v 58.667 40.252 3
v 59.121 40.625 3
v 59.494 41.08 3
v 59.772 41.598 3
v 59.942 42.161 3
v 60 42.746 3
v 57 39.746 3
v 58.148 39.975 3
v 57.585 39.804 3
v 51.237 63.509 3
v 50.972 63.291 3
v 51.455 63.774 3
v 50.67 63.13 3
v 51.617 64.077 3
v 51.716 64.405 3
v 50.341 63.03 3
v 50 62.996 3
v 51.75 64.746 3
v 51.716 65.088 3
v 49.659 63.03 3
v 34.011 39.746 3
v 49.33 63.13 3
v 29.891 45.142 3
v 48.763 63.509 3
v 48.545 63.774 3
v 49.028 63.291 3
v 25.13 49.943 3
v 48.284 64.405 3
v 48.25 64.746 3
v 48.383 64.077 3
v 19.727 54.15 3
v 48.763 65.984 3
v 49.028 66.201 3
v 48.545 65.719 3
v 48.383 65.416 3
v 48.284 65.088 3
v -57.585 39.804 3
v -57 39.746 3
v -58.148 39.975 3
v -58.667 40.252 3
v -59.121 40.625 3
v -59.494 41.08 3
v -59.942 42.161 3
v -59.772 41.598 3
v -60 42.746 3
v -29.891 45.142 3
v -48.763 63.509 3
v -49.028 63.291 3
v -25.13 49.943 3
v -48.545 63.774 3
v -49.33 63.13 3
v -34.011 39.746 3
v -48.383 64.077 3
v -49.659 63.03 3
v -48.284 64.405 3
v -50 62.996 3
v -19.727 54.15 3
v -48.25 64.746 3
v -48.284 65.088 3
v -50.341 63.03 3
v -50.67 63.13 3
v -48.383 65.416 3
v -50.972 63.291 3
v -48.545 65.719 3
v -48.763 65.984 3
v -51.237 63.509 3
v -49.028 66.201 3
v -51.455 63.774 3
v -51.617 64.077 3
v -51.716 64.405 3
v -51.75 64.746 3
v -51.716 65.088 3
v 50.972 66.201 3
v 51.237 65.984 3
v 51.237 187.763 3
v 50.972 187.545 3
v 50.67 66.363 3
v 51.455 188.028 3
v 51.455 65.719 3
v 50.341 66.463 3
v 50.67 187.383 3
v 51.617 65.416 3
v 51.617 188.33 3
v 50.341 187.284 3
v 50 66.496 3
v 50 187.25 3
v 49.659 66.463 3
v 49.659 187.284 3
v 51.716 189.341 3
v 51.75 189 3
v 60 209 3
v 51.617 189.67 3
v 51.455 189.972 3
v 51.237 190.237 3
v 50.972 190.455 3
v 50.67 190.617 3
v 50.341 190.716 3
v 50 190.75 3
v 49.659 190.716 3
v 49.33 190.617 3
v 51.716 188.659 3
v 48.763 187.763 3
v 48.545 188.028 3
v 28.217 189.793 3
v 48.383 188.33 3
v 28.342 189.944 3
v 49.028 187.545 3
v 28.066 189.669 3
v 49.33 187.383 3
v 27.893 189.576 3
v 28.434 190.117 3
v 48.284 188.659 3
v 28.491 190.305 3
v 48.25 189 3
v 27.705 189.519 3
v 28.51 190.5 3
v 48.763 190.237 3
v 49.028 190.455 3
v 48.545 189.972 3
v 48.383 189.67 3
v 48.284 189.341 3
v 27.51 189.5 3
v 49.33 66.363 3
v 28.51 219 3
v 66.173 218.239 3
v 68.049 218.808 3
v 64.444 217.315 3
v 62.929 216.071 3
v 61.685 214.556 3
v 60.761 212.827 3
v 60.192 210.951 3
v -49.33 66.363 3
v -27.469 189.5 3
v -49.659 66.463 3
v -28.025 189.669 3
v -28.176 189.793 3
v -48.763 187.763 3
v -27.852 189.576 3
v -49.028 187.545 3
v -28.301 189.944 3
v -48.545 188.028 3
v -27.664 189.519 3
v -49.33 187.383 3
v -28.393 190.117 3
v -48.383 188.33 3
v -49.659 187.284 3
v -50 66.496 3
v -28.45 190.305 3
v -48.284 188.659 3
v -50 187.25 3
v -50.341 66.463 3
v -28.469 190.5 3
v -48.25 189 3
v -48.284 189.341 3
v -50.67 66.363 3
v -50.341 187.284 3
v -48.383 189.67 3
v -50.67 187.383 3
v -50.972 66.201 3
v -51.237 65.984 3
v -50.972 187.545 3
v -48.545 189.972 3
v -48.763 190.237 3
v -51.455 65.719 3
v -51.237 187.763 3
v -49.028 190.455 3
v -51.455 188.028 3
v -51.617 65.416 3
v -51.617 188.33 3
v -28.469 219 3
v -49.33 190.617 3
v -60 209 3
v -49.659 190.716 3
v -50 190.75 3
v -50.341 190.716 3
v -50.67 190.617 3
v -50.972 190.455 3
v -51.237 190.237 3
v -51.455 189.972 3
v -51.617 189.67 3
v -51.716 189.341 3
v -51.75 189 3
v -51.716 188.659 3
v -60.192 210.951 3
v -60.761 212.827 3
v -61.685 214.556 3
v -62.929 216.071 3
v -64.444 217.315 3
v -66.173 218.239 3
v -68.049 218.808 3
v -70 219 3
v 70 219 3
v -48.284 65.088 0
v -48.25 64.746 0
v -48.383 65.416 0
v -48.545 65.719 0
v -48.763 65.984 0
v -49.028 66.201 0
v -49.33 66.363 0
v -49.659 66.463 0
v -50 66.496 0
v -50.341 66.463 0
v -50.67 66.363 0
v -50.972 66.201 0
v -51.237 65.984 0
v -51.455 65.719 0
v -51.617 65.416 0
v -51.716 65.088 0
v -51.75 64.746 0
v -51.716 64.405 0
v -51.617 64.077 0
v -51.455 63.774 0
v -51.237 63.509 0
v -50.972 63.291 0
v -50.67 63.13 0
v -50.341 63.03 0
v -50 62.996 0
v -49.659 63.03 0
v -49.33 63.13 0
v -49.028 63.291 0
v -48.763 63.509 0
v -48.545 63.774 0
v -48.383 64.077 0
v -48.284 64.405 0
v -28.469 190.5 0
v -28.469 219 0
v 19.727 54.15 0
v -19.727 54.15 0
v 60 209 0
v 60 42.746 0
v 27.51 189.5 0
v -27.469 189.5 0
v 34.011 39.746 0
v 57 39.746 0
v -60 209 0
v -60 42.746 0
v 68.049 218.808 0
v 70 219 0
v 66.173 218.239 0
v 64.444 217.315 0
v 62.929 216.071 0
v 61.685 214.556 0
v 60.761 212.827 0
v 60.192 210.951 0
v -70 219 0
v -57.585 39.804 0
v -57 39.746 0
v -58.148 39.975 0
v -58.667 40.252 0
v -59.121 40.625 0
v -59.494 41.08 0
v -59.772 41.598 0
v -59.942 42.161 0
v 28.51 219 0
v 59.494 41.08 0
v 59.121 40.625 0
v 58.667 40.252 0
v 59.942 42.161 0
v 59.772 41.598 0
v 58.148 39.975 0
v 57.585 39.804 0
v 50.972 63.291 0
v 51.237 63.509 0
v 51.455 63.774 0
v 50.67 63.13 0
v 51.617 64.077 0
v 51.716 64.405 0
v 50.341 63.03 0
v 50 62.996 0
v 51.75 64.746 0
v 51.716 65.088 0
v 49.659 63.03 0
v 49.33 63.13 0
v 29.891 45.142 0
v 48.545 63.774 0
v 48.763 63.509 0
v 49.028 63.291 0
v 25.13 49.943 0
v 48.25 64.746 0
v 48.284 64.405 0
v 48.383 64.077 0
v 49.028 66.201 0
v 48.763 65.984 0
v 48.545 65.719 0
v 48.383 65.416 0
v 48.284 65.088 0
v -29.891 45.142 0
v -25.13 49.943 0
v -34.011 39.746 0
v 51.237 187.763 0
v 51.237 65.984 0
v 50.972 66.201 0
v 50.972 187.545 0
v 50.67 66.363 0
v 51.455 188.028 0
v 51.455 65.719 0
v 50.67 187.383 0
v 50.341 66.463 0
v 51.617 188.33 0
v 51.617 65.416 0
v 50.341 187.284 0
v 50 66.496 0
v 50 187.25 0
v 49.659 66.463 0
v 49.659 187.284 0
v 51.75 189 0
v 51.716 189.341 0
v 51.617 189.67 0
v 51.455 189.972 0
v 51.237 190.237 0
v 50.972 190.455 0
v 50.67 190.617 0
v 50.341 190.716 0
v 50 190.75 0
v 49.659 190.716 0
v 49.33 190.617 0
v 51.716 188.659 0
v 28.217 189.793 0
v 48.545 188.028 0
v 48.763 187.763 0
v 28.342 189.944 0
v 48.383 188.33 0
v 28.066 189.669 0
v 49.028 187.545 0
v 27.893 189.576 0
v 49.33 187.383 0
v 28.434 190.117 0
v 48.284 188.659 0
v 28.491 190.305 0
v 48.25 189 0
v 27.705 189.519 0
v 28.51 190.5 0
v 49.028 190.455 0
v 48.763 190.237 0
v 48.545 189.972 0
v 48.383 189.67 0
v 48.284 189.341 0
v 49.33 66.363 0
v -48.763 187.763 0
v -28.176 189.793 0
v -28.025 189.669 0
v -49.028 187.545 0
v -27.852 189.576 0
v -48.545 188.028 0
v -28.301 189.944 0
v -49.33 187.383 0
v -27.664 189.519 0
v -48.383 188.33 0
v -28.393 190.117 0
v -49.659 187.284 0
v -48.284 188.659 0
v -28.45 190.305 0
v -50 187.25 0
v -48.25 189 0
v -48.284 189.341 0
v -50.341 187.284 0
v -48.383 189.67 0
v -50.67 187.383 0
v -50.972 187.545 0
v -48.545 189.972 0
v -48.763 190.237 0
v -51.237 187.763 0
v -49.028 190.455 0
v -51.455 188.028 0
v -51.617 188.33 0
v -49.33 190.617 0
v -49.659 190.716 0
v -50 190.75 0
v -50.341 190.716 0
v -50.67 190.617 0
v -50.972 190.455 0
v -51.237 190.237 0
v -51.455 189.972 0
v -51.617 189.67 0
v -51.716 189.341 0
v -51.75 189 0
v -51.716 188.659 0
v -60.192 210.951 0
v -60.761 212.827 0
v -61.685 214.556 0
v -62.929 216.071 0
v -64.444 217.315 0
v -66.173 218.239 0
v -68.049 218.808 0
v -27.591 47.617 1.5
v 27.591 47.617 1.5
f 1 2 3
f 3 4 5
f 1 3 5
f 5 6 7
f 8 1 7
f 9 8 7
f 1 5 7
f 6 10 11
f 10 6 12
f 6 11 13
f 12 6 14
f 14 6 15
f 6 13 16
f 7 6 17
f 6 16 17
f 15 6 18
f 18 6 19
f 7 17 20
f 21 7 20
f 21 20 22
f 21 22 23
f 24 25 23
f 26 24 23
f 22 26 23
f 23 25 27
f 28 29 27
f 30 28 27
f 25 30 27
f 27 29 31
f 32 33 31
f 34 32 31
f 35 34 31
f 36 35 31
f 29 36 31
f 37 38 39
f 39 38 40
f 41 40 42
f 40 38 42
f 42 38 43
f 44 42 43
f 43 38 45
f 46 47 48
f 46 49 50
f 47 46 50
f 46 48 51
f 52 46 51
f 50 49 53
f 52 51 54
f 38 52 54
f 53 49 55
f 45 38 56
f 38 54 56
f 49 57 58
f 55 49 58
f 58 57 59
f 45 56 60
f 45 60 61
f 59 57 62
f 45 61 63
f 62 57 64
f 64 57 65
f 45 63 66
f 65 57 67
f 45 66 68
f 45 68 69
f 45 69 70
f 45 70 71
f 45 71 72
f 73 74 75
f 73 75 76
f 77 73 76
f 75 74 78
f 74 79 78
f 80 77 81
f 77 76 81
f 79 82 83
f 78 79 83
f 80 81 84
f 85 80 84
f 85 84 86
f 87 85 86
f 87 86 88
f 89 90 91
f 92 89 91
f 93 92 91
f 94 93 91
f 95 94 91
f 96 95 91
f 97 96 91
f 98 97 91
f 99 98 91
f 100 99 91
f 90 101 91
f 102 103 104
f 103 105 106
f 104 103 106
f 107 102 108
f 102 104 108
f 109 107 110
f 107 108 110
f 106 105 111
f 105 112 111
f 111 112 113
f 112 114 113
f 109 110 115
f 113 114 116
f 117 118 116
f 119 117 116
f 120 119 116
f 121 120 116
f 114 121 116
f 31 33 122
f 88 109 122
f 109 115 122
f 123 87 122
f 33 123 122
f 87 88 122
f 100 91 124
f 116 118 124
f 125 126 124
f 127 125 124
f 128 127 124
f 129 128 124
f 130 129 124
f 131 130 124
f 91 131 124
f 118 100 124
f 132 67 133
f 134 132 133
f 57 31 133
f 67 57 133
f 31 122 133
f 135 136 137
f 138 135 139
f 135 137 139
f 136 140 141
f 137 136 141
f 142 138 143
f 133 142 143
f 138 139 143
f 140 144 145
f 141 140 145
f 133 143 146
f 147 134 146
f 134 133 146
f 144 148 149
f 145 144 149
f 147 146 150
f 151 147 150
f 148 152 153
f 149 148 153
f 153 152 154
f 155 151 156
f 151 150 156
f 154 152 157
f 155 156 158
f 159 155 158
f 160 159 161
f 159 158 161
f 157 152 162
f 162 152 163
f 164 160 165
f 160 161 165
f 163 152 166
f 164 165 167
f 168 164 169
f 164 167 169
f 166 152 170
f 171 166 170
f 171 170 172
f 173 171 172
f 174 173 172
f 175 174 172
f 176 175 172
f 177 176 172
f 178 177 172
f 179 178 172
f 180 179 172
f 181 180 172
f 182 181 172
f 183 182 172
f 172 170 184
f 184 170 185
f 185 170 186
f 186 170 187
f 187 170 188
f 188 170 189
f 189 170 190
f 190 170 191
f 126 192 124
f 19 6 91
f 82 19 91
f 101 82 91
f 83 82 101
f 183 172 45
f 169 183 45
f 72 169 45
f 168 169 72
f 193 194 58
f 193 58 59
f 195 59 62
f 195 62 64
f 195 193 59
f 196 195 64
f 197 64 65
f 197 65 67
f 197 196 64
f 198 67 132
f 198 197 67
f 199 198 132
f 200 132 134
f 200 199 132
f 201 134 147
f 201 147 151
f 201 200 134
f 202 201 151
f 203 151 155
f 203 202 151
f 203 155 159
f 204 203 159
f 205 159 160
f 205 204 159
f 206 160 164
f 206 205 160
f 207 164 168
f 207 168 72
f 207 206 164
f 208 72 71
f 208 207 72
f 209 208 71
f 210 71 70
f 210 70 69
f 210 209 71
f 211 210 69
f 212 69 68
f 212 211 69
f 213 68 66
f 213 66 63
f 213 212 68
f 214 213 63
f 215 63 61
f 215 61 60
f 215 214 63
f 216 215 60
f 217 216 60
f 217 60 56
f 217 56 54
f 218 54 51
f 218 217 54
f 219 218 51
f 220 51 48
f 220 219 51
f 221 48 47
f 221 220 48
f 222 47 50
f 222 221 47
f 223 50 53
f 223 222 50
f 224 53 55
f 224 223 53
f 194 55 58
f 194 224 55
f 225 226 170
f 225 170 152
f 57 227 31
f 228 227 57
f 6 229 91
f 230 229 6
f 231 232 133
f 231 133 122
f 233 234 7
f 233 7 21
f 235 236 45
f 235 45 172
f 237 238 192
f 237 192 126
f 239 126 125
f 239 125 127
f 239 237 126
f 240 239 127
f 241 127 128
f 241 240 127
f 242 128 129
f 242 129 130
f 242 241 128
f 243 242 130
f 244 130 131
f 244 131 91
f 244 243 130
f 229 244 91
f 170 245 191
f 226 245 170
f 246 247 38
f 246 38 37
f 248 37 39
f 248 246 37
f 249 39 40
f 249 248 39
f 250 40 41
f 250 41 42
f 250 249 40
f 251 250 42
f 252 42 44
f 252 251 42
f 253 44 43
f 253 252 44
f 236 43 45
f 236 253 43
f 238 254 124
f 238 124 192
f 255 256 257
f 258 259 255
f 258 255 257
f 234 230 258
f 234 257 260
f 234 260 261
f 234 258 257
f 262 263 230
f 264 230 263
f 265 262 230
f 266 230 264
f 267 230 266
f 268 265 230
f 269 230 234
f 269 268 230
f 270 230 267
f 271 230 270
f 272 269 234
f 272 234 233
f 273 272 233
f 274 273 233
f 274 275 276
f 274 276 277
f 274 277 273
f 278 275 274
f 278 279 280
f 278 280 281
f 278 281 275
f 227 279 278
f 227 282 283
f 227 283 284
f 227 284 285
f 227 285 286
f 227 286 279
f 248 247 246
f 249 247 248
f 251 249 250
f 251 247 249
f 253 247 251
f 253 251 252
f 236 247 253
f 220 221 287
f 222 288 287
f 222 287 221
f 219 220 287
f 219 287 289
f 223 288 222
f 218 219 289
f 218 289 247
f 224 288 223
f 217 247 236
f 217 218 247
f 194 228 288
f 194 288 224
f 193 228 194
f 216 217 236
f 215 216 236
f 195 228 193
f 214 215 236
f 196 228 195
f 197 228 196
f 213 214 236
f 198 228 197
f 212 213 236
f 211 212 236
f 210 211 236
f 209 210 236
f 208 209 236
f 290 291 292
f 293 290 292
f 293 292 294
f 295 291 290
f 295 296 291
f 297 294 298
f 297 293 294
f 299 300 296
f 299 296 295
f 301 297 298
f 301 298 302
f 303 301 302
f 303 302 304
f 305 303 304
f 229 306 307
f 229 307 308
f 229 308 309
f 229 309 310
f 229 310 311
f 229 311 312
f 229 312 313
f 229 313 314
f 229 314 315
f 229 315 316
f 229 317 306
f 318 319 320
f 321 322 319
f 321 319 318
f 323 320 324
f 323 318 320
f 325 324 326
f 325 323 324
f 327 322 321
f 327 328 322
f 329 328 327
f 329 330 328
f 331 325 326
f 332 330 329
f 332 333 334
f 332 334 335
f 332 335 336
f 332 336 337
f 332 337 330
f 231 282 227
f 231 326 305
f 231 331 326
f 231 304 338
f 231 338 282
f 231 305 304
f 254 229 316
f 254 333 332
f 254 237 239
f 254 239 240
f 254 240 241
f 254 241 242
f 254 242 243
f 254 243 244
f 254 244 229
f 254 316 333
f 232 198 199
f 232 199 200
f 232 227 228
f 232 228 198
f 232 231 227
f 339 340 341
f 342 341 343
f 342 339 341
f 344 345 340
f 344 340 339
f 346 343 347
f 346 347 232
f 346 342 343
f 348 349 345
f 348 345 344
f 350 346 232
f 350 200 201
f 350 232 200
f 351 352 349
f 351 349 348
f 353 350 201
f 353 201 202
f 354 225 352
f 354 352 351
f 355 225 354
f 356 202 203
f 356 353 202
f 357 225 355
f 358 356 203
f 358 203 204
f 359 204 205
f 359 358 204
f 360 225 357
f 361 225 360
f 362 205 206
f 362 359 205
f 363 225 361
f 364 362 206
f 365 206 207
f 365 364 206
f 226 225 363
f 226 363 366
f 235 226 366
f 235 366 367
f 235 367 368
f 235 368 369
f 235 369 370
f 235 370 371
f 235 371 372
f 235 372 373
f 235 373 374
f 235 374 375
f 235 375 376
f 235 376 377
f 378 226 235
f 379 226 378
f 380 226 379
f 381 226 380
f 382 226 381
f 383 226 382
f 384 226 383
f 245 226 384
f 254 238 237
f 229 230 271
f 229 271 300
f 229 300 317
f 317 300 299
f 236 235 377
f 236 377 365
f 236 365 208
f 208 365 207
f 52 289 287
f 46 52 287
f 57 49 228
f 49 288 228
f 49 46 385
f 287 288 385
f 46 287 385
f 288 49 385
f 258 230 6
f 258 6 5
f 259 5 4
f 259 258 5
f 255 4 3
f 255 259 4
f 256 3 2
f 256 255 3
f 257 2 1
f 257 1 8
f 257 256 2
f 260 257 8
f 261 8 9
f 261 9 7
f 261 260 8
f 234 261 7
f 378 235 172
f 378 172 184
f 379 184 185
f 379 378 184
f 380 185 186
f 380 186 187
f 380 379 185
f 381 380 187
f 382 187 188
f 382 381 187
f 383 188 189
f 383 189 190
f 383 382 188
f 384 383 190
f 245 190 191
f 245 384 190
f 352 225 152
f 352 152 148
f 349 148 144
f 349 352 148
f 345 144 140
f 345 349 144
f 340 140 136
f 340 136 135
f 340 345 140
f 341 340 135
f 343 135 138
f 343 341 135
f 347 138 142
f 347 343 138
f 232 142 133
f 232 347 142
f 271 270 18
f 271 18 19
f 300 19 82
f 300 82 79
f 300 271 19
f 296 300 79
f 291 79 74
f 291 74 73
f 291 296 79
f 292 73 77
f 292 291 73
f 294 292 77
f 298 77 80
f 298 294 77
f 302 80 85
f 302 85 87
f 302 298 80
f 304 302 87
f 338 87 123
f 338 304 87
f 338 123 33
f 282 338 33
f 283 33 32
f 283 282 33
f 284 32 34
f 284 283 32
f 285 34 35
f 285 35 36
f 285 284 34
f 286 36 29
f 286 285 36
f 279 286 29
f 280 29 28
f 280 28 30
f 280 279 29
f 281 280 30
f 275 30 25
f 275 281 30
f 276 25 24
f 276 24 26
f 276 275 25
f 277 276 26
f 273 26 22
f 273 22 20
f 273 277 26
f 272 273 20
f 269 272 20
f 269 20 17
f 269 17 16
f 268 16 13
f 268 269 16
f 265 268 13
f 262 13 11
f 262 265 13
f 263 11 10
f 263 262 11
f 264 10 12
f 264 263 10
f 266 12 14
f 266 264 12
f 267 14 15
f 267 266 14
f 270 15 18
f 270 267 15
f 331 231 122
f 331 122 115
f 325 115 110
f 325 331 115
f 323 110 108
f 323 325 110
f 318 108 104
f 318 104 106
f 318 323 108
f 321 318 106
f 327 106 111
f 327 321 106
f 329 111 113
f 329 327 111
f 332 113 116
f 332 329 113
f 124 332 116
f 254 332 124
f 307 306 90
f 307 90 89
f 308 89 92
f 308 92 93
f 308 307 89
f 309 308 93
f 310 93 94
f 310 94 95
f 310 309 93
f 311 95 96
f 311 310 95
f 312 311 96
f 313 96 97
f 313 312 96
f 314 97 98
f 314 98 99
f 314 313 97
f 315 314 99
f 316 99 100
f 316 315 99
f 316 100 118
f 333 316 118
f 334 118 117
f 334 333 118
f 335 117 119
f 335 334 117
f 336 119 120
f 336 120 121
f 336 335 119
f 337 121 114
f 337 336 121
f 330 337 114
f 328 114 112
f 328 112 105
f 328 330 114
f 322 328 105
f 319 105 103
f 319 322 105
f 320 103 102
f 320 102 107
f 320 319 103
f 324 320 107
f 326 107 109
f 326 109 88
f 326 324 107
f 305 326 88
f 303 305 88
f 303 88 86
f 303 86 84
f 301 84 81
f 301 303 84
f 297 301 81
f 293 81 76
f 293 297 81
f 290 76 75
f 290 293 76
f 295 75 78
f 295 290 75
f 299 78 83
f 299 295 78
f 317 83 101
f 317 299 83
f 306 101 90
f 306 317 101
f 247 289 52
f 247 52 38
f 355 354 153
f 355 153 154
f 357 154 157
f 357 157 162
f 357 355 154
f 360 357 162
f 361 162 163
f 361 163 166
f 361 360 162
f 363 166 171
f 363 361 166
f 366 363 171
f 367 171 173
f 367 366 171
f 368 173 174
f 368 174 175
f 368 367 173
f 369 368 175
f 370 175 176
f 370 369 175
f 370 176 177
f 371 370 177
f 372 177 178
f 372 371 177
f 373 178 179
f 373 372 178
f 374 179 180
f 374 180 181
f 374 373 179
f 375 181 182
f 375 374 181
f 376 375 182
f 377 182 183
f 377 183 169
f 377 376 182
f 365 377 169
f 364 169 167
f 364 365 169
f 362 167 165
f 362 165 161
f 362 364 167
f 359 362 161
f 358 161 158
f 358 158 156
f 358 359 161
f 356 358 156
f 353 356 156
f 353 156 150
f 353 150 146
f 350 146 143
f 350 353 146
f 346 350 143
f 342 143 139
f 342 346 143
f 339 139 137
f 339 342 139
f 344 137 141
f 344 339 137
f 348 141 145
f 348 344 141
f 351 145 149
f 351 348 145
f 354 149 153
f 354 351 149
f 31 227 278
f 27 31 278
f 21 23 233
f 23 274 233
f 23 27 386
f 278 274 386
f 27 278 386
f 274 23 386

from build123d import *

# Parameters (mm, degrees)
SKETCH1_R           = 1.75
BOSS_EXTRUDE1_DEPTH = 3


with BuildPart() as part:
    # Sketch1 → Boss-Extrude1 (new body)
    with BuildSketch(Plane.XY):
        with BuildLine():
            Line((-69.999999999, 218.999999943), (-28.469288178, 218.999999943))
            Line((-28.469288178, 218.999999943), (-28.469288178, 190.499999944))
            ThreePointArc((-28.469288178, 190.499999944), (-28.176394959, 189.792893162), (-27.469288178, 189.499999944))
            Line((-27.469288178, 189.499999944), (27.510237275, 189.499999944))
            ThreePointArc((27.510237275, 189.499999944), (28.217344056, 189.792893162), (28.510237275, 190.499999944))
            Line((28.510237275, 190.499999944), (28.510237275, 219.000000001))
            Line((28.510237275, 219.000000001), (70, 219.000000001))
            ThreePointArc((70, 219.000000001), (62.928932188, 216.071067813), (60, 209.000000001))
            Line((60, 209.000000001), (60.000000001, 42.74629253))
            ThreePointArc((60.000000001, 42.74629253), (59.121320345, 40.624972187), (57.000000001, 39.74629253))
            Line((57.000000001, 39.74629253), (34.010726172, 39.74629253))
            add(Edge.make_bspline(
                [(19.726580347, 54.15000005), (28.313482135, 48.285383123), (34.010726172, 39.74629253)],
                knots=[0, 0, 0, 1, 1, 1], degree=2))
            Line((19.726580347, 54.15000005), (-19.726580417, 54.150000001))
            add(Edge.make_bspline(
                [(-34.010726207, 39.746292473), (-28.313482185, 48.285383067), (-19.726580417, 54.150000001)],
                knots=[0, 0, 0, 1, 1, 1], degree=2))
            Line((-34.010726207, 39.746292473), (-56.999999999, 39.746292473))
            ThreePointArc((-56.999999999, 39.746292473), (-59.121320343, 40.624972129), (-59.999999999, 42.746292473))
            Line((-59.999999999, 42.746292473), (-59.999999999, 208.999999944))
            ThreePointArc((-59.999999999, 208.999999944), (-62.928932187, 216.071067755), (-69.999999999, 218.999999943))
        make_face()
        with Locations((-50, 189)):
            Circle(SKETCH1_R, mode=Mode.SUBTRACT)
        with Locations((50, 189.000000001)):
            Circle(SKETCH1_R, mode=Mode.SUBTRACT)
        with Locations((-49.999999999, 64.74629253)):
            Circle(SKETCH1_R, mode=Mode.SUBTRACT)
        with Locations((50.000000001, 64.74629253)):
            Circle(SKETCH1_R, mode=Mode.SUBTRACT)
    extrude(amount=BOSS_EXTRUDE1_DEPTH)


solid = part.part
